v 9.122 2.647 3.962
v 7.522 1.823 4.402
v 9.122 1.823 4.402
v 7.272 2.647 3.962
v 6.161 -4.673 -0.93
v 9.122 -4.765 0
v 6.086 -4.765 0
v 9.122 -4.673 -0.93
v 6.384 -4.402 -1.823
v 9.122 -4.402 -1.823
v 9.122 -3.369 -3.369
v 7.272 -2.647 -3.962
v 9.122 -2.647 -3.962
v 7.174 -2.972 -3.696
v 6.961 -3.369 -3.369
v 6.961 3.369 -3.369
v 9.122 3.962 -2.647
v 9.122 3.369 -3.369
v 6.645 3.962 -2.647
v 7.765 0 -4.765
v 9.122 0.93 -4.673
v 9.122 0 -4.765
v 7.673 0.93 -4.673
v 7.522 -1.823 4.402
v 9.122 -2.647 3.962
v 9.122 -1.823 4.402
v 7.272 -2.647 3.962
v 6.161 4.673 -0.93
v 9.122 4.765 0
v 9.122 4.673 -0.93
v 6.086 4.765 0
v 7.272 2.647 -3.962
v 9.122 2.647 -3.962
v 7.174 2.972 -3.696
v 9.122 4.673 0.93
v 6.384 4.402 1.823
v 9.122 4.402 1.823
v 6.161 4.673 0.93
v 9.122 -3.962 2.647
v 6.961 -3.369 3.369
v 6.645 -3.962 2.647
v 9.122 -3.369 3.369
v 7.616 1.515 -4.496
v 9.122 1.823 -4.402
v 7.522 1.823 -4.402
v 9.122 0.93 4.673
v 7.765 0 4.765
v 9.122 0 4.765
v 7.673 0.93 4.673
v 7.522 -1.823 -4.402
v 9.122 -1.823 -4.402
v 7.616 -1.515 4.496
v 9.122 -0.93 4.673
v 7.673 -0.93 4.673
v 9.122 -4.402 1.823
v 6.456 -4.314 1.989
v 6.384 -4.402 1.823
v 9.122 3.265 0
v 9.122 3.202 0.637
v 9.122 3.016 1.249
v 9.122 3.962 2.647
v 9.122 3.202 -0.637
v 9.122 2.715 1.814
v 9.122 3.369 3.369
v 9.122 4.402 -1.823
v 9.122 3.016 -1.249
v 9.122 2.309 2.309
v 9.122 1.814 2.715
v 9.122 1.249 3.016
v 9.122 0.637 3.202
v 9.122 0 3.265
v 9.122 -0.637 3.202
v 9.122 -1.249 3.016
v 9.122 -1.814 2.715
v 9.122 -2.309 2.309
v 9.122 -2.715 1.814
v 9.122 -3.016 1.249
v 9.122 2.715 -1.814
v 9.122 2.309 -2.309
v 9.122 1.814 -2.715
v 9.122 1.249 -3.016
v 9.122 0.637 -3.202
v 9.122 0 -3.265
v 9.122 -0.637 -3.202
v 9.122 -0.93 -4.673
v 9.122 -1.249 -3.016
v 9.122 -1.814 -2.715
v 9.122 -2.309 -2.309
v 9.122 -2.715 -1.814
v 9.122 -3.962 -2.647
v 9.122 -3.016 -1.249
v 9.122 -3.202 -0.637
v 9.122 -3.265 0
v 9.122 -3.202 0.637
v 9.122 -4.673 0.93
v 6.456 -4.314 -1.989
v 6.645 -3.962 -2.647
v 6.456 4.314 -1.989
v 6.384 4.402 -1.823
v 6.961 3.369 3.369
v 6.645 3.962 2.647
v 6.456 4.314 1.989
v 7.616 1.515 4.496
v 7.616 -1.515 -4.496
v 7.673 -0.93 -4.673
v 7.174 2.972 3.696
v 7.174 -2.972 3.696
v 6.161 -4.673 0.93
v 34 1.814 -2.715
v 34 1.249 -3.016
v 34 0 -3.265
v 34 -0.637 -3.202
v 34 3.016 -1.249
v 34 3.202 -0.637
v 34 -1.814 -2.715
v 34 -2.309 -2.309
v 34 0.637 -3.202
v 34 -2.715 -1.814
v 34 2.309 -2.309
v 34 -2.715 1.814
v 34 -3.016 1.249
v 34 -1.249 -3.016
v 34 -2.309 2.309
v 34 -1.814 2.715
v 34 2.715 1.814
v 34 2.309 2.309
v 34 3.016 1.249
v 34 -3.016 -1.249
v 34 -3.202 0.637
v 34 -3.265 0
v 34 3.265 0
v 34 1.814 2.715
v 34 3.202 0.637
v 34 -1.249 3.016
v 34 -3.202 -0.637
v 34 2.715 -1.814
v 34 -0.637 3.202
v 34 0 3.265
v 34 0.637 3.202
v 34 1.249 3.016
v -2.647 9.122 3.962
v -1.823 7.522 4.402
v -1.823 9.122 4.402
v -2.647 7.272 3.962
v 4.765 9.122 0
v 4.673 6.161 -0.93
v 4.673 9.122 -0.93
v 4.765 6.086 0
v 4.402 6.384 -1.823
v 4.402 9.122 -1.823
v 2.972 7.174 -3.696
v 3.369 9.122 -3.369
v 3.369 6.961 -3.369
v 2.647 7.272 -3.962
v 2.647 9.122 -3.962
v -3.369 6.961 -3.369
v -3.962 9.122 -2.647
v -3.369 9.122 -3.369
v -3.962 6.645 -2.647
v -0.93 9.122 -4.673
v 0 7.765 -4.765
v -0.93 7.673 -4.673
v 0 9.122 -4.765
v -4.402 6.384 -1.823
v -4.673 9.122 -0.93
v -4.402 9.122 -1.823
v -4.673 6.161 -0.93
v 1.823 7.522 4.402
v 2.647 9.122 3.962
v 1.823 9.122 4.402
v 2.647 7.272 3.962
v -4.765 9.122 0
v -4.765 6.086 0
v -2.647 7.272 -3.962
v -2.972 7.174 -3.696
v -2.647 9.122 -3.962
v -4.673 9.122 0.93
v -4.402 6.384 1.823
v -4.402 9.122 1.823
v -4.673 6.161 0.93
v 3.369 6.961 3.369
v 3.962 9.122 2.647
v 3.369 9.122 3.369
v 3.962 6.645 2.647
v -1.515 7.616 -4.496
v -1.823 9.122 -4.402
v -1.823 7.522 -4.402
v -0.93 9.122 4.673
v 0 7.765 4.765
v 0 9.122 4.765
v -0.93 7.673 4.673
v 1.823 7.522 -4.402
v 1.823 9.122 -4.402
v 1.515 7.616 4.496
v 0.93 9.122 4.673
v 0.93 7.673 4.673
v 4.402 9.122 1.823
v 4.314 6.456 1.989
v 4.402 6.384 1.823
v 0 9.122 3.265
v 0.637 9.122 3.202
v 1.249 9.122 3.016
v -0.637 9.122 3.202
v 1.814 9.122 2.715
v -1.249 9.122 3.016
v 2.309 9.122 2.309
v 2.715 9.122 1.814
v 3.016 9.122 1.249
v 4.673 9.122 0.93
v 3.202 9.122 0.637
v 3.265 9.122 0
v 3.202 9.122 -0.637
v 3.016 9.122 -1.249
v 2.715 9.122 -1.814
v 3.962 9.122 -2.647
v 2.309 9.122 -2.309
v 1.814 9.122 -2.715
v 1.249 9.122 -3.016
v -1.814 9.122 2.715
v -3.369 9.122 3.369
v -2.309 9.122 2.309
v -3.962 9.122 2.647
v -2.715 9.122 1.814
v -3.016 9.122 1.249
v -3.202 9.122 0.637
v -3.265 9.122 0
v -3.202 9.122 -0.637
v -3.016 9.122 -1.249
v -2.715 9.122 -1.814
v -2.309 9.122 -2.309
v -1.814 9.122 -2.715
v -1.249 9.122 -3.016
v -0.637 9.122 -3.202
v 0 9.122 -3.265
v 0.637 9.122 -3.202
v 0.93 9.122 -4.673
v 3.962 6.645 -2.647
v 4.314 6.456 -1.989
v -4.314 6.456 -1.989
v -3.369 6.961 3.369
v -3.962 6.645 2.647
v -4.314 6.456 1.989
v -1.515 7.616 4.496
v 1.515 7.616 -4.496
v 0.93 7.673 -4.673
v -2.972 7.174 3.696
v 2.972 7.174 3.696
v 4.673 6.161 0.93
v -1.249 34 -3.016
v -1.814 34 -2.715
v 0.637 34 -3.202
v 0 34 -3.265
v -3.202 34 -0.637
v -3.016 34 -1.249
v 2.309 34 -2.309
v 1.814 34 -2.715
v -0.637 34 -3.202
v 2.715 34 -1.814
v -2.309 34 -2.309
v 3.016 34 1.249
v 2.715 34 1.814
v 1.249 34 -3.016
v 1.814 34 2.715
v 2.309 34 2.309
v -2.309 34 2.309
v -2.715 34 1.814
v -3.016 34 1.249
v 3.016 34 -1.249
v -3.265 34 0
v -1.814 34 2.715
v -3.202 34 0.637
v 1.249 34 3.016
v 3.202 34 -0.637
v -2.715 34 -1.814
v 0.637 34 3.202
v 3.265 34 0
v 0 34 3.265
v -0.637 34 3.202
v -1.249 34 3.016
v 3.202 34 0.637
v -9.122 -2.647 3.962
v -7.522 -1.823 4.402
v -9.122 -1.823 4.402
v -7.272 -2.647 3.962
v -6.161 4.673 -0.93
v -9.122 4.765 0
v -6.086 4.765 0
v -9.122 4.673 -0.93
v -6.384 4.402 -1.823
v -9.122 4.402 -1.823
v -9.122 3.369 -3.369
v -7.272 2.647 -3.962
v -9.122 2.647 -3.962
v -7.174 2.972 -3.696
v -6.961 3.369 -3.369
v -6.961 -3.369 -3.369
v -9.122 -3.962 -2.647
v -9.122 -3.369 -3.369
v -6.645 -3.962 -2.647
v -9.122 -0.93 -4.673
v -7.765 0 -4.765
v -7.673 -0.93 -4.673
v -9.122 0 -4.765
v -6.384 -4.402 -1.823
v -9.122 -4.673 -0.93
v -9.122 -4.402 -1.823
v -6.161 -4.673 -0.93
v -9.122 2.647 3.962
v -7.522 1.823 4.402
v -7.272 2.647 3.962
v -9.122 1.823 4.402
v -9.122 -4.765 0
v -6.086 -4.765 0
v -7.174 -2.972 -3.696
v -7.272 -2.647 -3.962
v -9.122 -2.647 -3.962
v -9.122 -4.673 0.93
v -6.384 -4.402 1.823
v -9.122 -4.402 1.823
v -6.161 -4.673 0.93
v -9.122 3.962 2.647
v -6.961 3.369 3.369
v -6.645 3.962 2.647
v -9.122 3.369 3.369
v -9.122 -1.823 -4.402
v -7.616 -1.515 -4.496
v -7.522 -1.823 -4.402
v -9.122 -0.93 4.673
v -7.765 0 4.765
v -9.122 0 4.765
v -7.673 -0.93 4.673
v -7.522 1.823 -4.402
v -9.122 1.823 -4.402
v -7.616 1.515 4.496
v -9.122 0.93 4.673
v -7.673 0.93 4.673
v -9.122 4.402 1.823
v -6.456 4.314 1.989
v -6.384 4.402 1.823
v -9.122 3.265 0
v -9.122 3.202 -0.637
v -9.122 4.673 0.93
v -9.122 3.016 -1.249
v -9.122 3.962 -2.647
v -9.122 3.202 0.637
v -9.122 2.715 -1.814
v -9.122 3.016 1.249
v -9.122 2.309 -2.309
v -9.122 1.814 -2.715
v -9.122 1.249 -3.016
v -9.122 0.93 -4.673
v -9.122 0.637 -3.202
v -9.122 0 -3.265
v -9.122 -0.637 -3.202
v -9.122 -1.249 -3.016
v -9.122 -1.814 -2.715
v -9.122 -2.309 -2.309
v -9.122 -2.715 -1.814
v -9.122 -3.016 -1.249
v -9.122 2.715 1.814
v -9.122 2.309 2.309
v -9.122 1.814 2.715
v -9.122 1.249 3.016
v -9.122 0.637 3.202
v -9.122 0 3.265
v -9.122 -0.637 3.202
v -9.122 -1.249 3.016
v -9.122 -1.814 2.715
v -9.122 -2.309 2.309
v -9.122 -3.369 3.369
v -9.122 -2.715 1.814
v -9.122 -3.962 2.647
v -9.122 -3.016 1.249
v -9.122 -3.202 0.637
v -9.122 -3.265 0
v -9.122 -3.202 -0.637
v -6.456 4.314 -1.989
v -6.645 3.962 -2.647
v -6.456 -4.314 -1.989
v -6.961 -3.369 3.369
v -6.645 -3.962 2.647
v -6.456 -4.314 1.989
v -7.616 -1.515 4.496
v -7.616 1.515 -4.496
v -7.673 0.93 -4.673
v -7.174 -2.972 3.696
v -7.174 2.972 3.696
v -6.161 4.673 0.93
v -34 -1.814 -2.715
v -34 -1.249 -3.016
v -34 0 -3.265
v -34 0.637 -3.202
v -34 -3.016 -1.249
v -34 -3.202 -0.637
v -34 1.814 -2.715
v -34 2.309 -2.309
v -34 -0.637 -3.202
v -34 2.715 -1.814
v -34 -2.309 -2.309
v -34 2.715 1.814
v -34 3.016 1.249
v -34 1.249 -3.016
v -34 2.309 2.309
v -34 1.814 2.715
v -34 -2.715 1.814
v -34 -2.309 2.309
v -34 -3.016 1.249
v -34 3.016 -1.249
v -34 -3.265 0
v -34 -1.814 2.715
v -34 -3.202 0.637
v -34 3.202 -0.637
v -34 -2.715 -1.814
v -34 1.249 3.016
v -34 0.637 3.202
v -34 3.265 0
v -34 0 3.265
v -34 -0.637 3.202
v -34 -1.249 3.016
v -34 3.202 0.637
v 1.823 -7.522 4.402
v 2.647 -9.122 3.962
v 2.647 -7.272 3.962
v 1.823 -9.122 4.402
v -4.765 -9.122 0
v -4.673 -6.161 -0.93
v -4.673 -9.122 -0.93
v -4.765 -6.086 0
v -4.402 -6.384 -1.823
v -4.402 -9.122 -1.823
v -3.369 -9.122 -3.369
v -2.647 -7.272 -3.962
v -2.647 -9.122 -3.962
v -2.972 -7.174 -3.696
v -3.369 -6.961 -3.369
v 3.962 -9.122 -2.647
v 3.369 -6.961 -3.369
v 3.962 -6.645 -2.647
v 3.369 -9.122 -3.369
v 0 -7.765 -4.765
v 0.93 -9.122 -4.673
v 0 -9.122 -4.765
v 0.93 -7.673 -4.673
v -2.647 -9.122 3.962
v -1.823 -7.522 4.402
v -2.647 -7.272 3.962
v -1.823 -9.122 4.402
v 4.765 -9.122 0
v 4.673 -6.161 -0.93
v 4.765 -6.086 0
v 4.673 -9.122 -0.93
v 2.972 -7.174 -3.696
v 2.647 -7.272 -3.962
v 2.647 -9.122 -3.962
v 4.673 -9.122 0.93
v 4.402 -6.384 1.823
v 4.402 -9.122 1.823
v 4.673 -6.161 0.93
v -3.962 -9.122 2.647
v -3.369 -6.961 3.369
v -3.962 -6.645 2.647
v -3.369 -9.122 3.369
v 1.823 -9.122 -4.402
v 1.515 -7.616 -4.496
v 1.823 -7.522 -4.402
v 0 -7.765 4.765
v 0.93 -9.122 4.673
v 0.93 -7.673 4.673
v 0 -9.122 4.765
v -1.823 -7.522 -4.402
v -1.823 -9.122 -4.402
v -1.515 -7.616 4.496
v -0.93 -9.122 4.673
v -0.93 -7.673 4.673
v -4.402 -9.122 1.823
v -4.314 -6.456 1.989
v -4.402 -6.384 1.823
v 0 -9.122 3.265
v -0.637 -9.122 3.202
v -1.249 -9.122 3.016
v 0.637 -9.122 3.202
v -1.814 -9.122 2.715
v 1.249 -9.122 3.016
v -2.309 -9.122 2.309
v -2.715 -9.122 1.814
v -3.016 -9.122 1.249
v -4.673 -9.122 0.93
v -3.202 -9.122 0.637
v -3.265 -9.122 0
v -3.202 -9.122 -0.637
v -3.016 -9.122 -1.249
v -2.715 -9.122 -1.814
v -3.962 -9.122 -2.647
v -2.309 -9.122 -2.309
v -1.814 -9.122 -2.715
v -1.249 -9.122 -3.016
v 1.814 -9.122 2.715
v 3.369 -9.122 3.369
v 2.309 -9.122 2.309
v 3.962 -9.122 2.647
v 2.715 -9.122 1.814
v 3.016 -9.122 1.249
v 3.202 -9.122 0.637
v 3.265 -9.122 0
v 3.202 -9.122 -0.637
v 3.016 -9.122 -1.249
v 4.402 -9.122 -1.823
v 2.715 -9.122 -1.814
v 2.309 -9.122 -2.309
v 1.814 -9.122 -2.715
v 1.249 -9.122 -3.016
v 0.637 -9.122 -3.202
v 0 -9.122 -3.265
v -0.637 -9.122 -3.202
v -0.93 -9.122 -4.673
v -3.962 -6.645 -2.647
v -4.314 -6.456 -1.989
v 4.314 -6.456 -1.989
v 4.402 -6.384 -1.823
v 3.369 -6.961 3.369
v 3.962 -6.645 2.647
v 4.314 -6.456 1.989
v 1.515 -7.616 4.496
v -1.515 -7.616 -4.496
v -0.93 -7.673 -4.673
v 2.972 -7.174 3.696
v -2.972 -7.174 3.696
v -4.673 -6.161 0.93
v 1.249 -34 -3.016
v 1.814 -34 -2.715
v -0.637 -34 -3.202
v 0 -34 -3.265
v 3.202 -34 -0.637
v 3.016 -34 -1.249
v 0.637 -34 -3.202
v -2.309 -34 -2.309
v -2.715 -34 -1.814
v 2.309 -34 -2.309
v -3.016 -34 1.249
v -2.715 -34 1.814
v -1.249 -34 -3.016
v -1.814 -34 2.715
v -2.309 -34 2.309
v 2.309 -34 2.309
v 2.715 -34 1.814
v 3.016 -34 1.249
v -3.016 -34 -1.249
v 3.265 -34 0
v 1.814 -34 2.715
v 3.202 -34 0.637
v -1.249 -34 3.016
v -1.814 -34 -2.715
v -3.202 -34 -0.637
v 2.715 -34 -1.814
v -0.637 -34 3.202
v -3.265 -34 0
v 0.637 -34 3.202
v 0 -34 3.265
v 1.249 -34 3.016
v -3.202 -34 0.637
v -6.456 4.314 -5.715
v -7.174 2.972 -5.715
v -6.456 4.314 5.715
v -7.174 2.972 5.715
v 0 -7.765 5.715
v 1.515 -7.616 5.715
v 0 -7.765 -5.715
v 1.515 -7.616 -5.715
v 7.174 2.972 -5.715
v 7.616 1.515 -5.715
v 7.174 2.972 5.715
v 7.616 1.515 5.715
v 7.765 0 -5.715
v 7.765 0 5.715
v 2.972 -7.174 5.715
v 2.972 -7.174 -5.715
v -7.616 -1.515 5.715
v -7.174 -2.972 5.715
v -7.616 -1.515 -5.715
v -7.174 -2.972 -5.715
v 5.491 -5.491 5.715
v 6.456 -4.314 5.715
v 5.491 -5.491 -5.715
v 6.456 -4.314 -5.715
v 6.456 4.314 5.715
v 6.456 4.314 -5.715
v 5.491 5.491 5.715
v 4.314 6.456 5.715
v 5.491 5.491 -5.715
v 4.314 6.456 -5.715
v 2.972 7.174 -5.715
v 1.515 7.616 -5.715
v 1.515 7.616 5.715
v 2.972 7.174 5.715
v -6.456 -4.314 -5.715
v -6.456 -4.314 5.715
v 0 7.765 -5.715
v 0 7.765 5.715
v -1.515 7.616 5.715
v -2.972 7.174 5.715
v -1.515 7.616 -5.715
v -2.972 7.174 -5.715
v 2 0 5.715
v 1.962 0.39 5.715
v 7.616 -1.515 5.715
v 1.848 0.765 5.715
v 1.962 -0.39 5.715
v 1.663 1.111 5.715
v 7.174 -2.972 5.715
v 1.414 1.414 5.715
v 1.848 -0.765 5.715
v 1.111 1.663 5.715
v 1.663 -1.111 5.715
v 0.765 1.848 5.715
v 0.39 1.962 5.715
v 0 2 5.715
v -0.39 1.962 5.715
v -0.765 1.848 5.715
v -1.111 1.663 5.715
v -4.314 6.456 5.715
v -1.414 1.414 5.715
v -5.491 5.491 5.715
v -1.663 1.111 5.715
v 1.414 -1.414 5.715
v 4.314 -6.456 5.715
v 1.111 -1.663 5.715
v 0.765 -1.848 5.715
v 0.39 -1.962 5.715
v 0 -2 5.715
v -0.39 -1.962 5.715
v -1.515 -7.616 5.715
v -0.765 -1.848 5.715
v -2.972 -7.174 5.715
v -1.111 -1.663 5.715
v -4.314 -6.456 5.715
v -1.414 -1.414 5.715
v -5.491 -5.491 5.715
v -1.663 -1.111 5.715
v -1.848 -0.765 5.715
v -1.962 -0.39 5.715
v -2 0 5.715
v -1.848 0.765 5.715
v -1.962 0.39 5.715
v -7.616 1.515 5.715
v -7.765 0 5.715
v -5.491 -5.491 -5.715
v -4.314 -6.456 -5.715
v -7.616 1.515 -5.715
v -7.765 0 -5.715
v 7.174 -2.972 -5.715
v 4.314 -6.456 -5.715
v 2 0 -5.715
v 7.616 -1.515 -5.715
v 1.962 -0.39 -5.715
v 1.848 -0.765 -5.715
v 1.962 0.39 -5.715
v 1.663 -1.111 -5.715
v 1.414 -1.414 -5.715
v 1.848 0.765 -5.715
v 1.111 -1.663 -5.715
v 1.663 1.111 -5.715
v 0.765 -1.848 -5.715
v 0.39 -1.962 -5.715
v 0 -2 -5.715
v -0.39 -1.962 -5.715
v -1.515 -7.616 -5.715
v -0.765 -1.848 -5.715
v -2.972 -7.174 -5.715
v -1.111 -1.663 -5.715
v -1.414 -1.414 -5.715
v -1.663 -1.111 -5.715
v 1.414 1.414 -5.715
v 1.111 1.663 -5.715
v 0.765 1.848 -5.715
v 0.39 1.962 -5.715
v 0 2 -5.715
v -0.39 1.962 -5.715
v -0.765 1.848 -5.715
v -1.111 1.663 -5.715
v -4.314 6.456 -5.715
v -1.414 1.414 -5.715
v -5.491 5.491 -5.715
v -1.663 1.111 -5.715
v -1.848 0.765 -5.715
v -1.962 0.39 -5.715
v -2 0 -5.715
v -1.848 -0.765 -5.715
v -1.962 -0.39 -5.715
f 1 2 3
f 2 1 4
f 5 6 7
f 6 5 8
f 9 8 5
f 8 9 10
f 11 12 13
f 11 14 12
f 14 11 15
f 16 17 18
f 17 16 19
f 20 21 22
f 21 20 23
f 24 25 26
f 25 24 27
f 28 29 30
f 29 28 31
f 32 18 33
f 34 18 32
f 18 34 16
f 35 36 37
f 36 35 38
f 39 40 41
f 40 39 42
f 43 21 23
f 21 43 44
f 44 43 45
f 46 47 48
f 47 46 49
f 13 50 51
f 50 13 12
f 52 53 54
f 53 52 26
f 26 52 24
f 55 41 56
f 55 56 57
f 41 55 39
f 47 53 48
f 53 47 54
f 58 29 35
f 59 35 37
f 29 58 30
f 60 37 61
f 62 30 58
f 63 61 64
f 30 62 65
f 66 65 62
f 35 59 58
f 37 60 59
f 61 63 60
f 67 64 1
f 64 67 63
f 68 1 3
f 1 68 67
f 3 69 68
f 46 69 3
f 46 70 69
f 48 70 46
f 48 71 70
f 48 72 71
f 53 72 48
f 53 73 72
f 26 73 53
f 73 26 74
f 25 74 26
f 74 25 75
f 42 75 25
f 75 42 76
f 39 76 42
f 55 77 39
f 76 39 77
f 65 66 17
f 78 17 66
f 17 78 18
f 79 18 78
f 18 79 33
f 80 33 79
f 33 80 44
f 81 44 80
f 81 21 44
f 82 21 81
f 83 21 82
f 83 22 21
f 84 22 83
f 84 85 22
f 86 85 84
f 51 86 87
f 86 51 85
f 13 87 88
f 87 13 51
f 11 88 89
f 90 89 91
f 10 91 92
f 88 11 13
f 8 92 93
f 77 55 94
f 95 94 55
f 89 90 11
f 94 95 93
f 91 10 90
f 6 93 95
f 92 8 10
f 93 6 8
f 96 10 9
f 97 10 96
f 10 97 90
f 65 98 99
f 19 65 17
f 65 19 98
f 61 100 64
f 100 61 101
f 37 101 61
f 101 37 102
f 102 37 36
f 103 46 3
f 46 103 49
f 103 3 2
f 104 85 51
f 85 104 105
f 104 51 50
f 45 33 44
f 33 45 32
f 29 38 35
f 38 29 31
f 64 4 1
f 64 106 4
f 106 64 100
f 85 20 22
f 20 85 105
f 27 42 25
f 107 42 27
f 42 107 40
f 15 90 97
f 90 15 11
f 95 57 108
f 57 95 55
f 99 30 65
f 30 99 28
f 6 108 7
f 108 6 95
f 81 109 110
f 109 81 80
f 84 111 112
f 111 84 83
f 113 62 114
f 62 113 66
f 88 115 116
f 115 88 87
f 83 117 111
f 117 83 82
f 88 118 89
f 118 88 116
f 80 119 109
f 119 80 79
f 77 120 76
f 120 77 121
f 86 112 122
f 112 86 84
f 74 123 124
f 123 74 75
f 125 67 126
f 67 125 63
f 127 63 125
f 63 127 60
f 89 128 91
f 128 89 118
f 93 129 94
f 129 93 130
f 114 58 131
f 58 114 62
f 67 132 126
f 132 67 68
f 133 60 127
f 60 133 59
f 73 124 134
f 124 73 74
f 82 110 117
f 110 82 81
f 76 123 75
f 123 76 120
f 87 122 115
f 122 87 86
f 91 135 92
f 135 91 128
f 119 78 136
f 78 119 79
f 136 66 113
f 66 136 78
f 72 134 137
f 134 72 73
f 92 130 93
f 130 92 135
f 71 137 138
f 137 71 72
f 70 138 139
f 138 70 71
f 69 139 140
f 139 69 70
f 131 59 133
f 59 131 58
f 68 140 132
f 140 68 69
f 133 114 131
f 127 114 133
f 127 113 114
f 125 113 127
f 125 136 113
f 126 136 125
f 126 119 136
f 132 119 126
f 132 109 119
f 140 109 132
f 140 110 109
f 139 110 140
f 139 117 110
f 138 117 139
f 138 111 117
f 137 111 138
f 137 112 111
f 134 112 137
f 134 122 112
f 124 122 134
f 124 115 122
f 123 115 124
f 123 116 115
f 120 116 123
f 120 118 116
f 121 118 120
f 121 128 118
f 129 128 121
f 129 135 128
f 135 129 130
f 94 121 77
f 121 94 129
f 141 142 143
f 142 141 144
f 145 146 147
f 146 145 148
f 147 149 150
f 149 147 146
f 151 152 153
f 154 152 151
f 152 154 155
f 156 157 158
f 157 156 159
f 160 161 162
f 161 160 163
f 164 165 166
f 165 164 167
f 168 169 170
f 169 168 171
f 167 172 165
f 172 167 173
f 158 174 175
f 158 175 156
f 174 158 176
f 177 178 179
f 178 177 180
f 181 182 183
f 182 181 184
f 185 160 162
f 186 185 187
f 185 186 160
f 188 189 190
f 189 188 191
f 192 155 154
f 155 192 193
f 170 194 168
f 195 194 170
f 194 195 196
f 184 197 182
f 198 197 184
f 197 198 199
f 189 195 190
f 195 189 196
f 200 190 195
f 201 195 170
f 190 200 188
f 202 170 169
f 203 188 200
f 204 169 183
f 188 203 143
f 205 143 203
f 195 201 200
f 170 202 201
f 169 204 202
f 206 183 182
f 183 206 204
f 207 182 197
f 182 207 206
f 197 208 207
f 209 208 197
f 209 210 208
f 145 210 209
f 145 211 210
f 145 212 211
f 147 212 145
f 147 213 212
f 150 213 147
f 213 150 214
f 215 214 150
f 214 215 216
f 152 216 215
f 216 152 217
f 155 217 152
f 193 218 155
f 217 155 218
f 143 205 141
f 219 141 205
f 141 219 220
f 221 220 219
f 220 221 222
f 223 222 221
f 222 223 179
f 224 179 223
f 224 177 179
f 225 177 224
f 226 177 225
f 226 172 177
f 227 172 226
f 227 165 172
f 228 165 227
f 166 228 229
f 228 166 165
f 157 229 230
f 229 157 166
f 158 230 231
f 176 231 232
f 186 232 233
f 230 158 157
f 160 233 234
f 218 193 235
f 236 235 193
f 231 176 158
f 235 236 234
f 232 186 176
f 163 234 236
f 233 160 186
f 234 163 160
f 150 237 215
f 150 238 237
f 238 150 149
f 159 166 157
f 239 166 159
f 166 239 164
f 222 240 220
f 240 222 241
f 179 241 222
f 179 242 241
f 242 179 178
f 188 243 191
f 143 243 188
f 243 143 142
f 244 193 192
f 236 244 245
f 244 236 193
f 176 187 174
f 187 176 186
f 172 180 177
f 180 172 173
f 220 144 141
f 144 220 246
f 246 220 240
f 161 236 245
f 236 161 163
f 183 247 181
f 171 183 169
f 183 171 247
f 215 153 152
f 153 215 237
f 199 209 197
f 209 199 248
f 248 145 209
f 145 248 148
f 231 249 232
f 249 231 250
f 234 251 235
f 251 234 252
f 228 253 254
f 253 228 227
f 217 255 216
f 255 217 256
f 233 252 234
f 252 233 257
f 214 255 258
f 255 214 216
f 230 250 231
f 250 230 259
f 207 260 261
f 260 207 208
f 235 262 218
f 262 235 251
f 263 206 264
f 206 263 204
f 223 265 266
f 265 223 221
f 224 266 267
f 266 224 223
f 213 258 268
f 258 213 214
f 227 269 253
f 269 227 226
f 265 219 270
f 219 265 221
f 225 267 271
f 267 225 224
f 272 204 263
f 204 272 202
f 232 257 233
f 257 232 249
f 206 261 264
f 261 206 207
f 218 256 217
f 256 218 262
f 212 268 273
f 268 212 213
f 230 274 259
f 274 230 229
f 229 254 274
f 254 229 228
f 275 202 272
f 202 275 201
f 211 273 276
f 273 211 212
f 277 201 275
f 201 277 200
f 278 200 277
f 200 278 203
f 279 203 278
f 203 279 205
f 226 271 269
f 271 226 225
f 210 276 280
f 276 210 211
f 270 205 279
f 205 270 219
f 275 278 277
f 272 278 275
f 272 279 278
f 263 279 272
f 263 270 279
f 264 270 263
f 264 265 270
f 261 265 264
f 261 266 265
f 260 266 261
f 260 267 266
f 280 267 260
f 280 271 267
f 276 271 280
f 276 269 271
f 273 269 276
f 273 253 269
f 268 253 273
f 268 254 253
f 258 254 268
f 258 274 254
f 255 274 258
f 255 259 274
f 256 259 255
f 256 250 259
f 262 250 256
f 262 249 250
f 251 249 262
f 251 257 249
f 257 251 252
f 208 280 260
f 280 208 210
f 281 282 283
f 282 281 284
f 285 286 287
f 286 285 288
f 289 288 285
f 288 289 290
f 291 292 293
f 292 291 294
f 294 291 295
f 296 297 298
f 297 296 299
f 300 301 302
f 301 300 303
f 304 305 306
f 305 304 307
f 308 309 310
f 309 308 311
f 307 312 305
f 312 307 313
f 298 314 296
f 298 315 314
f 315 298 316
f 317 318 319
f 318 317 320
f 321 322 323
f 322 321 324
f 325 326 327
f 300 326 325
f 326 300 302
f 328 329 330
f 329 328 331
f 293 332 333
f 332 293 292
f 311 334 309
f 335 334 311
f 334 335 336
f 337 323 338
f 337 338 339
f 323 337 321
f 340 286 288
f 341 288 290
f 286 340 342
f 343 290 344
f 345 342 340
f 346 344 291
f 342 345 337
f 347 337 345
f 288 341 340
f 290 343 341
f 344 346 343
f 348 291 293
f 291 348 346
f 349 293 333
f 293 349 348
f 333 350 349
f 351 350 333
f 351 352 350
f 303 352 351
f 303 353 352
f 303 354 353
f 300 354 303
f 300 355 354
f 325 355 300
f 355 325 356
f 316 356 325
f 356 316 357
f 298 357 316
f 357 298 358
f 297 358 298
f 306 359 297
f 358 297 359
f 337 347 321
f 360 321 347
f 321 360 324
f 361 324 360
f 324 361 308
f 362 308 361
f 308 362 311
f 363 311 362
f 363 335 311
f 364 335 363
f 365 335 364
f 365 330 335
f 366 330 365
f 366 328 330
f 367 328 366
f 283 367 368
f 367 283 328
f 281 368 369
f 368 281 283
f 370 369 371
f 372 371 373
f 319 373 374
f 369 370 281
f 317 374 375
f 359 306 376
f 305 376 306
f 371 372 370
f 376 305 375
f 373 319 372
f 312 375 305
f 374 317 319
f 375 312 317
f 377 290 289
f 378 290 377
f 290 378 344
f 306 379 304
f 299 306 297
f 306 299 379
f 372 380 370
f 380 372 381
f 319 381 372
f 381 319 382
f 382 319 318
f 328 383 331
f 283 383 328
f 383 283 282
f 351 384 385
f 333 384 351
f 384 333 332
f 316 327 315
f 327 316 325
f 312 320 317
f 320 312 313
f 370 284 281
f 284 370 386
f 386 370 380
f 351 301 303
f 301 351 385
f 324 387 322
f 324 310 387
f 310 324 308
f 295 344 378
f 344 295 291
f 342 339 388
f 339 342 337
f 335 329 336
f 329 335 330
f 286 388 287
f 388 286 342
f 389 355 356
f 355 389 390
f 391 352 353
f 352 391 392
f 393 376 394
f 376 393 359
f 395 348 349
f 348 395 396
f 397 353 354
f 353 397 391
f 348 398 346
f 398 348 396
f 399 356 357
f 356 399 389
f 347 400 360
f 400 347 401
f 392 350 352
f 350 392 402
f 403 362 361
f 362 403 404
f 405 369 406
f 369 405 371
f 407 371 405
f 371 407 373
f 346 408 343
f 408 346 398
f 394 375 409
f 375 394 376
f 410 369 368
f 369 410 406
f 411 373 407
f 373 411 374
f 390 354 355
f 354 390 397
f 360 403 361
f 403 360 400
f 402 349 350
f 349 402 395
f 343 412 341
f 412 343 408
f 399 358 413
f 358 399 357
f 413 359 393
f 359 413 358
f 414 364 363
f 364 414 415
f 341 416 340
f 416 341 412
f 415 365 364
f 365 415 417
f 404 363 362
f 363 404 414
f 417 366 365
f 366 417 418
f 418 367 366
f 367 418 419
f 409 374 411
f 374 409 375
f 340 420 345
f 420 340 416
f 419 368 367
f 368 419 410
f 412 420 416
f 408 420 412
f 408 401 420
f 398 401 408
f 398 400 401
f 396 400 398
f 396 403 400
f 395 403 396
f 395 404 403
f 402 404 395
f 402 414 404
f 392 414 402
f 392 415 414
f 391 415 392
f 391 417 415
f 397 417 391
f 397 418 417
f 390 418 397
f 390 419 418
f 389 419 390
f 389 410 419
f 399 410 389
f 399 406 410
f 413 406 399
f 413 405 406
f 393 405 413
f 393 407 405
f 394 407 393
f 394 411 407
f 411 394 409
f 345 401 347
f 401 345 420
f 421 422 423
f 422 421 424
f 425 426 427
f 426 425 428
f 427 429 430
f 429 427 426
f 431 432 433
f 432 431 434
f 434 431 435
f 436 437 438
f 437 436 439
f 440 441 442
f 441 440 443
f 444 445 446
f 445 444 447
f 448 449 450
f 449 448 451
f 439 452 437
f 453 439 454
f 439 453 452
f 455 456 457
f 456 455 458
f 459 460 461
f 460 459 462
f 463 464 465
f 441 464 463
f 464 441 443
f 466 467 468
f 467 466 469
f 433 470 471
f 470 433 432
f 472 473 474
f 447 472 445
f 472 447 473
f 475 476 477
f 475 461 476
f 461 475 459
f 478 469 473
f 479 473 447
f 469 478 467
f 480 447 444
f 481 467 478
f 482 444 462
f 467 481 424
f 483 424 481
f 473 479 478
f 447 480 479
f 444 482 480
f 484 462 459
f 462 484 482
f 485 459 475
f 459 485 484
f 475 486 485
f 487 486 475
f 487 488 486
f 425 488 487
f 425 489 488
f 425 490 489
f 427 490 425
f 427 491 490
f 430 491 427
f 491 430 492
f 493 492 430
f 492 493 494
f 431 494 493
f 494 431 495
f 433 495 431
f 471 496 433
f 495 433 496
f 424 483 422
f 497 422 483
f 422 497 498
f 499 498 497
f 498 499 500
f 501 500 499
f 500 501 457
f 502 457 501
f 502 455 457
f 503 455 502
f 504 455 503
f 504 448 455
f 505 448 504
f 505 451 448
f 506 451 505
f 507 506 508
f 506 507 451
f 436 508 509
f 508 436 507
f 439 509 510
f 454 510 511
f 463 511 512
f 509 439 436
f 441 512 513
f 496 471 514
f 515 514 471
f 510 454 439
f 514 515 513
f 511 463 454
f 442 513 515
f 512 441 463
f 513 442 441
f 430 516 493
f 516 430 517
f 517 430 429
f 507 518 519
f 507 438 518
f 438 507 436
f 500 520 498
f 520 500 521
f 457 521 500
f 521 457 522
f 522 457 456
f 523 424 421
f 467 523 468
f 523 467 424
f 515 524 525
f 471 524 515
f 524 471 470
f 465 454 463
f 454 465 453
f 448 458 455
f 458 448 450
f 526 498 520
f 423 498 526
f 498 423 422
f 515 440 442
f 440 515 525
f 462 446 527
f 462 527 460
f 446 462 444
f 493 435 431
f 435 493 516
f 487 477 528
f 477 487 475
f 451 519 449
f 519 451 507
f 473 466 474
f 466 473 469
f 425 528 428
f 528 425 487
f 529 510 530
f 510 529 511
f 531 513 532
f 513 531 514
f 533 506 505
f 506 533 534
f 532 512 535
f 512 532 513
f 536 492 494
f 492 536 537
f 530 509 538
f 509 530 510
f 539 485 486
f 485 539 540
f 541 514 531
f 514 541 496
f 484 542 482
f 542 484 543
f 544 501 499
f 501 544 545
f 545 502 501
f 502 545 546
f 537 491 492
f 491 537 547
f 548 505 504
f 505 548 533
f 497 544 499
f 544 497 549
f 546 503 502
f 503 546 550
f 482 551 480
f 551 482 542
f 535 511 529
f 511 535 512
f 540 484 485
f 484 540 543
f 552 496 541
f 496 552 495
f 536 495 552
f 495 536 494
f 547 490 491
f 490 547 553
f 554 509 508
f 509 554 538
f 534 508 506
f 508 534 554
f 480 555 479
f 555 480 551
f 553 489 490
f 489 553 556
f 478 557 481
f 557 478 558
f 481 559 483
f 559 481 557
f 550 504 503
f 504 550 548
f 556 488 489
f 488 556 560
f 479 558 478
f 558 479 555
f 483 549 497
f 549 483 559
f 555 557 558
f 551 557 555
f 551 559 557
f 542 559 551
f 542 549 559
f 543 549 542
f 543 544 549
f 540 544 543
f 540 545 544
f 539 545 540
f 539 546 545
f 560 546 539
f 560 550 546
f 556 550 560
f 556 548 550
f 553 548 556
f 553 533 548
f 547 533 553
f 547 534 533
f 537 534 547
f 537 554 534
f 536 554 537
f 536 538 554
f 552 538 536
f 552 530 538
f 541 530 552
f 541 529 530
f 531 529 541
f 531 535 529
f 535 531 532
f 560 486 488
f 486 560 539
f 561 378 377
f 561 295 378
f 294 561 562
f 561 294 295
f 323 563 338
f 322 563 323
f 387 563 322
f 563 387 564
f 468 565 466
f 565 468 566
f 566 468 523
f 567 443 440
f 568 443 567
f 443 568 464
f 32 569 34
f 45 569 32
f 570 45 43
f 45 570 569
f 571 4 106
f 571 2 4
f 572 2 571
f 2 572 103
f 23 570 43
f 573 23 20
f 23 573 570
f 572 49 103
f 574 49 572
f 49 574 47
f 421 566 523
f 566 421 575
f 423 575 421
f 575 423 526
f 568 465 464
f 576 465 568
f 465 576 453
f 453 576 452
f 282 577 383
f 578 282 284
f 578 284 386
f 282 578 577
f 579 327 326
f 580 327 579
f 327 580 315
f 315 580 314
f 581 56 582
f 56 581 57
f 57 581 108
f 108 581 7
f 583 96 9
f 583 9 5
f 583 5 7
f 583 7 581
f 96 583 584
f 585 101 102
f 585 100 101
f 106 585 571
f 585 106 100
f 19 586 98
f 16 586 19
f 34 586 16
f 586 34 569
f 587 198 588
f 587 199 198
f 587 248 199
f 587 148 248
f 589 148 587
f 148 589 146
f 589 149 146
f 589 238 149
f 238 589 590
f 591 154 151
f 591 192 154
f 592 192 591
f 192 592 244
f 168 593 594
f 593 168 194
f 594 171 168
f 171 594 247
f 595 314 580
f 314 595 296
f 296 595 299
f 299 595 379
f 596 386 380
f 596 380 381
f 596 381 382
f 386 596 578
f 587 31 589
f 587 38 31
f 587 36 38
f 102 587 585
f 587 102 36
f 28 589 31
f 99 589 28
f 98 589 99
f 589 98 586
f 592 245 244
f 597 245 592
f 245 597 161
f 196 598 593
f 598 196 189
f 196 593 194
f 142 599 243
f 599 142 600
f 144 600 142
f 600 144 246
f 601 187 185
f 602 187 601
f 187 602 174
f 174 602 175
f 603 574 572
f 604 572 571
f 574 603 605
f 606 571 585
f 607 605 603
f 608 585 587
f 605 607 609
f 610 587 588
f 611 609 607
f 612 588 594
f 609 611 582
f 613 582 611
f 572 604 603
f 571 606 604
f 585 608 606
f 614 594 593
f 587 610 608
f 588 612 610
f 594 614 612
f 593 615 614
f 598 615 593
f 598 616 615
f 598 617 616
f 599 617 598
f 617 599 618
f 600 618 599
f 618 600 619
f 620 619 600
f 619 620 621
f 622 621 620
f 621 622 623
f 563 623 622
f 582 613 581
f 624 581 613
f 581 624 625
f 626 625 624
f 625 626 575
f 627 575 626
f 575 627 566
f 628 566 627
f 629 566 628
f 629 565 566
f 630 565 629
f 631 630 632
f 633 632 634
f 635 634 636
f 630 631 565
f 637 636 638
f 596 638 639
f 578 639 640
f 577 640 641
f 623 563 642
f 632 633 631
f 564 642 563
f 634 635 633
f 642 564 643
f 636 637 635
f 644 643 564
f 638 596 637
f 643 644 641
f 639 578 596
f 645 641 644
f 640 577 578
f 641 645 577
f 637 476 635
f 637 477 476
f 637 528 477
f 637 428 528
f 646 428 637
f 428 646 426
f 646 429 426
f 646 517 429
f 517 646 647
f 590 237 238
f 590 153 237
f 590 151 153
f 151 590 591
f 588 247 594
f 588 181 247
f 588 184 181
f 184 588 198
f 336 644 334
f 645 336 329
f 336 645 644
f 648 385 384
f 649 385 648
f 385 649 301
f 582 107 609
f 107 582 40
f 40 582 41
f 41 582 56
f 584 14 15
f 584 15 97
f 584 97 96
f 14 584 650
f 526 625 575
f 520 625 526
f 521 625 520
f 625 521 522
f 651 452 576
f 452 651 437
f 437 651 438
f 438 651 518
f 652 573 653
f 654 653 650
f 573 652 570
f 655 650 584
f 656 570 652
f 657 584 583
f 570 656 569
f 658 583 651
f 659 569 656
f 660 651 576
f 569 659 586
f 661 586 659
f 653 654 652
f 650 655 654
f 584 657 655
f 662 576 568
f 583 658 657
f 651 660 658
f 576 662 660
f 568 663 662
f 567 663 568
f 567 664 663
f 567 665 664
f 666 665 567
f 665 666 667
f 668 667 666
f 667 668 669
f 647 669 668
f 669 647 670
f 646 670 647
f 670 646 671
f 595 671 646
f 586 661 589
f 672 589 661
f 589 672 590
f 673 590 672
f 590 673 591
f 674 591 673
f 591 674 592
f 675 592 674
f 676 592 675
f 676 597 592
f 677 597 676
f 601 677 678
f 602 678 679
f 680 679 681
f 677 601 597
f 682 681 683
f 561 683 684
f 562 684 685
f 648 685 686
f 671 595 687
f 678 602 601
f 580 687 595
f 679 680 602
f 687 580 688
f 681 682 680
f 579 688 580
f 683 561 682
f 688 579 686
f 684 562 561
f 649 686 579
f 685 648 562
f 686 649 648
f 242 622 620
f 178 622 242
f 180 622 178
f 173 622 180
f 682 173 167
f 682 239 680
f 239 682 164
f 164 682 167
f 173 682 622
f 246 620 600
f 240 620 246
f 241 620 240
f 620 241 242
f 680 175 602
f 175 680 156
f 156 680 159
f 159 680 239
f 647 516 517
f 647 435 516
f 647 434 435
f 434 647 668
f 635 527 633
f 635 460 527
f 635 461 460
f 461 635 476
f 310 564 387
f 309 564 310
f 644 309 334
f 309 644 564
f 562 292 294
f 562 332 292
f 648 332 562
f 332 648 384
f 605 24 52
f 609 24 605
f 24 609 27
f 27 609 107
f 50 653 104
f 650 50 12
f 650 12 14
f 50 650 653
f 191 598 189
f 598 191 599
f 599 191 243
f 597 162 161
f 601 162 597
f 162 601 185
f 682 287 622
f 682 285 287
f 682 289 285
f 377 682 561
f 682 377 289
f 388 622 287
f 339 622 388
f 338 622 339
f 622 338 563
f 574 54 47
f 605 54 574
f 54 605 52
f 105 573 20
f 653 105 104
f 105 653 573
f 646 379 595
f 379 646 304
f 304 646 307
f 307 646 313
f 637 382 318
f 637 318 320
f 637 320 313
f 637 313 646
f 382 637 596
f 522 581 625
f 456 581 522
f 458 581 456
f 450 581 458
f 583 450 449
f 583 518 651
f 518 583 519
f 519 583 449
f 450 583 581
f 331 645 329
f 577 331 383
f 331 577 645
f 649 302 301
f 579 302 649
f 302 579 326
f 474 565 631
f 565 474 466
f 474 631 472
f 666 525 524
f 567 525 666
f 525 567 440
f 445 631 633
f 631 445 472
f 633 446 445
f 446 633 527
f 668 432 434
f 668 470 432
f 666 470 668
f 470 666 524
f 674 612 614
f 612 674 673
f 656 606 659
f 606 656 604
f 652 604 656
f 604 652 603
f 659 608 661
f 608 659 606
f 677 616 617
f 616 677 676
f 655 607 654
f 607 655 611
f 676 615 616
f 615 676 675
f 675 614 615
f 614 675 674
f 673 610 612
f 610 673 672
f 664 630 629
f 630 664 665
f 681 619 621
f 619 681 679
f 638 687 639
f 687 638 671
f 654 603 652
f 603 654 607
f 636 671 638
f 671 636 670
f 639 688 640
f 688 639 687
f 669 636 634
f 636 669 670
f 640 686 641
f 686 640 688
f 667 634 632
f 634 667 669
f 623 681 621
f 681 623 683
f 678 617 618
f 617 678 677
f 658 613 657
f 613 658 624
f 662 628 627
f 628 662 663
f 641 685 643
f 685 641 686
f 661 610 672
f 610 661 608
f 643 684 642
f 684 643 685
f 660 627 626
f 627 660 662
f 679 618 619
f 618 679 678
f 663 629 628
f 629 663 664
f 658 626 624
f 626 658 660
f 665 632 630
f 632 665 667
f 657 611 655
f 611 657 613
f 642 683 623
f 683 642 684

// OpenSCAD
$fn = 32;

// ----------------------------------------------------------------------
// Cardan cross: 68 mm span, 9.53 mm trunnions
// ----------------------------------------------------------------------

// --- parameters (mm) ---
journal_d = 9.53;         // trunnion diameter
arm_len = 34;             // trunnion length from the centre
step_r = 3.24;            // step position from the centre
step_d = 6.53;            // journal diameter after the step
hub_d = 15.53;            // hub diameter
hub_h = 11.43;            // hub height
bore_d = 4;               // hub bore

difference() {
  union() {
    /* hub along the joint axis */
    cylinder(h = hub_h, d = hub_d, center = true);
    for (a = [0 : 90 : 270]) rotate([0, 0, a]) {
      /* trunnion, sunk into the hub */
      translate([hub_d / 4, 0, 0]) rotate([0, 90, 0]) cylinder(h = step_r + 2, d = journal_d);
      /* stepped journal out to the tip */
      translate([step_r - 0.5, 0, 0]) rotate([0, 90, 0]) cylinder(h = arm_len + 0.5 - step_r, d = step_d);
    }
  }
  /* lubrication bore through the hub, 2.5 mm clear on both sides */
  translate([0, 0, -hub_h / 2 - 2.5]) cylinder(h = hub_h + 5, d = bore_d);
}
